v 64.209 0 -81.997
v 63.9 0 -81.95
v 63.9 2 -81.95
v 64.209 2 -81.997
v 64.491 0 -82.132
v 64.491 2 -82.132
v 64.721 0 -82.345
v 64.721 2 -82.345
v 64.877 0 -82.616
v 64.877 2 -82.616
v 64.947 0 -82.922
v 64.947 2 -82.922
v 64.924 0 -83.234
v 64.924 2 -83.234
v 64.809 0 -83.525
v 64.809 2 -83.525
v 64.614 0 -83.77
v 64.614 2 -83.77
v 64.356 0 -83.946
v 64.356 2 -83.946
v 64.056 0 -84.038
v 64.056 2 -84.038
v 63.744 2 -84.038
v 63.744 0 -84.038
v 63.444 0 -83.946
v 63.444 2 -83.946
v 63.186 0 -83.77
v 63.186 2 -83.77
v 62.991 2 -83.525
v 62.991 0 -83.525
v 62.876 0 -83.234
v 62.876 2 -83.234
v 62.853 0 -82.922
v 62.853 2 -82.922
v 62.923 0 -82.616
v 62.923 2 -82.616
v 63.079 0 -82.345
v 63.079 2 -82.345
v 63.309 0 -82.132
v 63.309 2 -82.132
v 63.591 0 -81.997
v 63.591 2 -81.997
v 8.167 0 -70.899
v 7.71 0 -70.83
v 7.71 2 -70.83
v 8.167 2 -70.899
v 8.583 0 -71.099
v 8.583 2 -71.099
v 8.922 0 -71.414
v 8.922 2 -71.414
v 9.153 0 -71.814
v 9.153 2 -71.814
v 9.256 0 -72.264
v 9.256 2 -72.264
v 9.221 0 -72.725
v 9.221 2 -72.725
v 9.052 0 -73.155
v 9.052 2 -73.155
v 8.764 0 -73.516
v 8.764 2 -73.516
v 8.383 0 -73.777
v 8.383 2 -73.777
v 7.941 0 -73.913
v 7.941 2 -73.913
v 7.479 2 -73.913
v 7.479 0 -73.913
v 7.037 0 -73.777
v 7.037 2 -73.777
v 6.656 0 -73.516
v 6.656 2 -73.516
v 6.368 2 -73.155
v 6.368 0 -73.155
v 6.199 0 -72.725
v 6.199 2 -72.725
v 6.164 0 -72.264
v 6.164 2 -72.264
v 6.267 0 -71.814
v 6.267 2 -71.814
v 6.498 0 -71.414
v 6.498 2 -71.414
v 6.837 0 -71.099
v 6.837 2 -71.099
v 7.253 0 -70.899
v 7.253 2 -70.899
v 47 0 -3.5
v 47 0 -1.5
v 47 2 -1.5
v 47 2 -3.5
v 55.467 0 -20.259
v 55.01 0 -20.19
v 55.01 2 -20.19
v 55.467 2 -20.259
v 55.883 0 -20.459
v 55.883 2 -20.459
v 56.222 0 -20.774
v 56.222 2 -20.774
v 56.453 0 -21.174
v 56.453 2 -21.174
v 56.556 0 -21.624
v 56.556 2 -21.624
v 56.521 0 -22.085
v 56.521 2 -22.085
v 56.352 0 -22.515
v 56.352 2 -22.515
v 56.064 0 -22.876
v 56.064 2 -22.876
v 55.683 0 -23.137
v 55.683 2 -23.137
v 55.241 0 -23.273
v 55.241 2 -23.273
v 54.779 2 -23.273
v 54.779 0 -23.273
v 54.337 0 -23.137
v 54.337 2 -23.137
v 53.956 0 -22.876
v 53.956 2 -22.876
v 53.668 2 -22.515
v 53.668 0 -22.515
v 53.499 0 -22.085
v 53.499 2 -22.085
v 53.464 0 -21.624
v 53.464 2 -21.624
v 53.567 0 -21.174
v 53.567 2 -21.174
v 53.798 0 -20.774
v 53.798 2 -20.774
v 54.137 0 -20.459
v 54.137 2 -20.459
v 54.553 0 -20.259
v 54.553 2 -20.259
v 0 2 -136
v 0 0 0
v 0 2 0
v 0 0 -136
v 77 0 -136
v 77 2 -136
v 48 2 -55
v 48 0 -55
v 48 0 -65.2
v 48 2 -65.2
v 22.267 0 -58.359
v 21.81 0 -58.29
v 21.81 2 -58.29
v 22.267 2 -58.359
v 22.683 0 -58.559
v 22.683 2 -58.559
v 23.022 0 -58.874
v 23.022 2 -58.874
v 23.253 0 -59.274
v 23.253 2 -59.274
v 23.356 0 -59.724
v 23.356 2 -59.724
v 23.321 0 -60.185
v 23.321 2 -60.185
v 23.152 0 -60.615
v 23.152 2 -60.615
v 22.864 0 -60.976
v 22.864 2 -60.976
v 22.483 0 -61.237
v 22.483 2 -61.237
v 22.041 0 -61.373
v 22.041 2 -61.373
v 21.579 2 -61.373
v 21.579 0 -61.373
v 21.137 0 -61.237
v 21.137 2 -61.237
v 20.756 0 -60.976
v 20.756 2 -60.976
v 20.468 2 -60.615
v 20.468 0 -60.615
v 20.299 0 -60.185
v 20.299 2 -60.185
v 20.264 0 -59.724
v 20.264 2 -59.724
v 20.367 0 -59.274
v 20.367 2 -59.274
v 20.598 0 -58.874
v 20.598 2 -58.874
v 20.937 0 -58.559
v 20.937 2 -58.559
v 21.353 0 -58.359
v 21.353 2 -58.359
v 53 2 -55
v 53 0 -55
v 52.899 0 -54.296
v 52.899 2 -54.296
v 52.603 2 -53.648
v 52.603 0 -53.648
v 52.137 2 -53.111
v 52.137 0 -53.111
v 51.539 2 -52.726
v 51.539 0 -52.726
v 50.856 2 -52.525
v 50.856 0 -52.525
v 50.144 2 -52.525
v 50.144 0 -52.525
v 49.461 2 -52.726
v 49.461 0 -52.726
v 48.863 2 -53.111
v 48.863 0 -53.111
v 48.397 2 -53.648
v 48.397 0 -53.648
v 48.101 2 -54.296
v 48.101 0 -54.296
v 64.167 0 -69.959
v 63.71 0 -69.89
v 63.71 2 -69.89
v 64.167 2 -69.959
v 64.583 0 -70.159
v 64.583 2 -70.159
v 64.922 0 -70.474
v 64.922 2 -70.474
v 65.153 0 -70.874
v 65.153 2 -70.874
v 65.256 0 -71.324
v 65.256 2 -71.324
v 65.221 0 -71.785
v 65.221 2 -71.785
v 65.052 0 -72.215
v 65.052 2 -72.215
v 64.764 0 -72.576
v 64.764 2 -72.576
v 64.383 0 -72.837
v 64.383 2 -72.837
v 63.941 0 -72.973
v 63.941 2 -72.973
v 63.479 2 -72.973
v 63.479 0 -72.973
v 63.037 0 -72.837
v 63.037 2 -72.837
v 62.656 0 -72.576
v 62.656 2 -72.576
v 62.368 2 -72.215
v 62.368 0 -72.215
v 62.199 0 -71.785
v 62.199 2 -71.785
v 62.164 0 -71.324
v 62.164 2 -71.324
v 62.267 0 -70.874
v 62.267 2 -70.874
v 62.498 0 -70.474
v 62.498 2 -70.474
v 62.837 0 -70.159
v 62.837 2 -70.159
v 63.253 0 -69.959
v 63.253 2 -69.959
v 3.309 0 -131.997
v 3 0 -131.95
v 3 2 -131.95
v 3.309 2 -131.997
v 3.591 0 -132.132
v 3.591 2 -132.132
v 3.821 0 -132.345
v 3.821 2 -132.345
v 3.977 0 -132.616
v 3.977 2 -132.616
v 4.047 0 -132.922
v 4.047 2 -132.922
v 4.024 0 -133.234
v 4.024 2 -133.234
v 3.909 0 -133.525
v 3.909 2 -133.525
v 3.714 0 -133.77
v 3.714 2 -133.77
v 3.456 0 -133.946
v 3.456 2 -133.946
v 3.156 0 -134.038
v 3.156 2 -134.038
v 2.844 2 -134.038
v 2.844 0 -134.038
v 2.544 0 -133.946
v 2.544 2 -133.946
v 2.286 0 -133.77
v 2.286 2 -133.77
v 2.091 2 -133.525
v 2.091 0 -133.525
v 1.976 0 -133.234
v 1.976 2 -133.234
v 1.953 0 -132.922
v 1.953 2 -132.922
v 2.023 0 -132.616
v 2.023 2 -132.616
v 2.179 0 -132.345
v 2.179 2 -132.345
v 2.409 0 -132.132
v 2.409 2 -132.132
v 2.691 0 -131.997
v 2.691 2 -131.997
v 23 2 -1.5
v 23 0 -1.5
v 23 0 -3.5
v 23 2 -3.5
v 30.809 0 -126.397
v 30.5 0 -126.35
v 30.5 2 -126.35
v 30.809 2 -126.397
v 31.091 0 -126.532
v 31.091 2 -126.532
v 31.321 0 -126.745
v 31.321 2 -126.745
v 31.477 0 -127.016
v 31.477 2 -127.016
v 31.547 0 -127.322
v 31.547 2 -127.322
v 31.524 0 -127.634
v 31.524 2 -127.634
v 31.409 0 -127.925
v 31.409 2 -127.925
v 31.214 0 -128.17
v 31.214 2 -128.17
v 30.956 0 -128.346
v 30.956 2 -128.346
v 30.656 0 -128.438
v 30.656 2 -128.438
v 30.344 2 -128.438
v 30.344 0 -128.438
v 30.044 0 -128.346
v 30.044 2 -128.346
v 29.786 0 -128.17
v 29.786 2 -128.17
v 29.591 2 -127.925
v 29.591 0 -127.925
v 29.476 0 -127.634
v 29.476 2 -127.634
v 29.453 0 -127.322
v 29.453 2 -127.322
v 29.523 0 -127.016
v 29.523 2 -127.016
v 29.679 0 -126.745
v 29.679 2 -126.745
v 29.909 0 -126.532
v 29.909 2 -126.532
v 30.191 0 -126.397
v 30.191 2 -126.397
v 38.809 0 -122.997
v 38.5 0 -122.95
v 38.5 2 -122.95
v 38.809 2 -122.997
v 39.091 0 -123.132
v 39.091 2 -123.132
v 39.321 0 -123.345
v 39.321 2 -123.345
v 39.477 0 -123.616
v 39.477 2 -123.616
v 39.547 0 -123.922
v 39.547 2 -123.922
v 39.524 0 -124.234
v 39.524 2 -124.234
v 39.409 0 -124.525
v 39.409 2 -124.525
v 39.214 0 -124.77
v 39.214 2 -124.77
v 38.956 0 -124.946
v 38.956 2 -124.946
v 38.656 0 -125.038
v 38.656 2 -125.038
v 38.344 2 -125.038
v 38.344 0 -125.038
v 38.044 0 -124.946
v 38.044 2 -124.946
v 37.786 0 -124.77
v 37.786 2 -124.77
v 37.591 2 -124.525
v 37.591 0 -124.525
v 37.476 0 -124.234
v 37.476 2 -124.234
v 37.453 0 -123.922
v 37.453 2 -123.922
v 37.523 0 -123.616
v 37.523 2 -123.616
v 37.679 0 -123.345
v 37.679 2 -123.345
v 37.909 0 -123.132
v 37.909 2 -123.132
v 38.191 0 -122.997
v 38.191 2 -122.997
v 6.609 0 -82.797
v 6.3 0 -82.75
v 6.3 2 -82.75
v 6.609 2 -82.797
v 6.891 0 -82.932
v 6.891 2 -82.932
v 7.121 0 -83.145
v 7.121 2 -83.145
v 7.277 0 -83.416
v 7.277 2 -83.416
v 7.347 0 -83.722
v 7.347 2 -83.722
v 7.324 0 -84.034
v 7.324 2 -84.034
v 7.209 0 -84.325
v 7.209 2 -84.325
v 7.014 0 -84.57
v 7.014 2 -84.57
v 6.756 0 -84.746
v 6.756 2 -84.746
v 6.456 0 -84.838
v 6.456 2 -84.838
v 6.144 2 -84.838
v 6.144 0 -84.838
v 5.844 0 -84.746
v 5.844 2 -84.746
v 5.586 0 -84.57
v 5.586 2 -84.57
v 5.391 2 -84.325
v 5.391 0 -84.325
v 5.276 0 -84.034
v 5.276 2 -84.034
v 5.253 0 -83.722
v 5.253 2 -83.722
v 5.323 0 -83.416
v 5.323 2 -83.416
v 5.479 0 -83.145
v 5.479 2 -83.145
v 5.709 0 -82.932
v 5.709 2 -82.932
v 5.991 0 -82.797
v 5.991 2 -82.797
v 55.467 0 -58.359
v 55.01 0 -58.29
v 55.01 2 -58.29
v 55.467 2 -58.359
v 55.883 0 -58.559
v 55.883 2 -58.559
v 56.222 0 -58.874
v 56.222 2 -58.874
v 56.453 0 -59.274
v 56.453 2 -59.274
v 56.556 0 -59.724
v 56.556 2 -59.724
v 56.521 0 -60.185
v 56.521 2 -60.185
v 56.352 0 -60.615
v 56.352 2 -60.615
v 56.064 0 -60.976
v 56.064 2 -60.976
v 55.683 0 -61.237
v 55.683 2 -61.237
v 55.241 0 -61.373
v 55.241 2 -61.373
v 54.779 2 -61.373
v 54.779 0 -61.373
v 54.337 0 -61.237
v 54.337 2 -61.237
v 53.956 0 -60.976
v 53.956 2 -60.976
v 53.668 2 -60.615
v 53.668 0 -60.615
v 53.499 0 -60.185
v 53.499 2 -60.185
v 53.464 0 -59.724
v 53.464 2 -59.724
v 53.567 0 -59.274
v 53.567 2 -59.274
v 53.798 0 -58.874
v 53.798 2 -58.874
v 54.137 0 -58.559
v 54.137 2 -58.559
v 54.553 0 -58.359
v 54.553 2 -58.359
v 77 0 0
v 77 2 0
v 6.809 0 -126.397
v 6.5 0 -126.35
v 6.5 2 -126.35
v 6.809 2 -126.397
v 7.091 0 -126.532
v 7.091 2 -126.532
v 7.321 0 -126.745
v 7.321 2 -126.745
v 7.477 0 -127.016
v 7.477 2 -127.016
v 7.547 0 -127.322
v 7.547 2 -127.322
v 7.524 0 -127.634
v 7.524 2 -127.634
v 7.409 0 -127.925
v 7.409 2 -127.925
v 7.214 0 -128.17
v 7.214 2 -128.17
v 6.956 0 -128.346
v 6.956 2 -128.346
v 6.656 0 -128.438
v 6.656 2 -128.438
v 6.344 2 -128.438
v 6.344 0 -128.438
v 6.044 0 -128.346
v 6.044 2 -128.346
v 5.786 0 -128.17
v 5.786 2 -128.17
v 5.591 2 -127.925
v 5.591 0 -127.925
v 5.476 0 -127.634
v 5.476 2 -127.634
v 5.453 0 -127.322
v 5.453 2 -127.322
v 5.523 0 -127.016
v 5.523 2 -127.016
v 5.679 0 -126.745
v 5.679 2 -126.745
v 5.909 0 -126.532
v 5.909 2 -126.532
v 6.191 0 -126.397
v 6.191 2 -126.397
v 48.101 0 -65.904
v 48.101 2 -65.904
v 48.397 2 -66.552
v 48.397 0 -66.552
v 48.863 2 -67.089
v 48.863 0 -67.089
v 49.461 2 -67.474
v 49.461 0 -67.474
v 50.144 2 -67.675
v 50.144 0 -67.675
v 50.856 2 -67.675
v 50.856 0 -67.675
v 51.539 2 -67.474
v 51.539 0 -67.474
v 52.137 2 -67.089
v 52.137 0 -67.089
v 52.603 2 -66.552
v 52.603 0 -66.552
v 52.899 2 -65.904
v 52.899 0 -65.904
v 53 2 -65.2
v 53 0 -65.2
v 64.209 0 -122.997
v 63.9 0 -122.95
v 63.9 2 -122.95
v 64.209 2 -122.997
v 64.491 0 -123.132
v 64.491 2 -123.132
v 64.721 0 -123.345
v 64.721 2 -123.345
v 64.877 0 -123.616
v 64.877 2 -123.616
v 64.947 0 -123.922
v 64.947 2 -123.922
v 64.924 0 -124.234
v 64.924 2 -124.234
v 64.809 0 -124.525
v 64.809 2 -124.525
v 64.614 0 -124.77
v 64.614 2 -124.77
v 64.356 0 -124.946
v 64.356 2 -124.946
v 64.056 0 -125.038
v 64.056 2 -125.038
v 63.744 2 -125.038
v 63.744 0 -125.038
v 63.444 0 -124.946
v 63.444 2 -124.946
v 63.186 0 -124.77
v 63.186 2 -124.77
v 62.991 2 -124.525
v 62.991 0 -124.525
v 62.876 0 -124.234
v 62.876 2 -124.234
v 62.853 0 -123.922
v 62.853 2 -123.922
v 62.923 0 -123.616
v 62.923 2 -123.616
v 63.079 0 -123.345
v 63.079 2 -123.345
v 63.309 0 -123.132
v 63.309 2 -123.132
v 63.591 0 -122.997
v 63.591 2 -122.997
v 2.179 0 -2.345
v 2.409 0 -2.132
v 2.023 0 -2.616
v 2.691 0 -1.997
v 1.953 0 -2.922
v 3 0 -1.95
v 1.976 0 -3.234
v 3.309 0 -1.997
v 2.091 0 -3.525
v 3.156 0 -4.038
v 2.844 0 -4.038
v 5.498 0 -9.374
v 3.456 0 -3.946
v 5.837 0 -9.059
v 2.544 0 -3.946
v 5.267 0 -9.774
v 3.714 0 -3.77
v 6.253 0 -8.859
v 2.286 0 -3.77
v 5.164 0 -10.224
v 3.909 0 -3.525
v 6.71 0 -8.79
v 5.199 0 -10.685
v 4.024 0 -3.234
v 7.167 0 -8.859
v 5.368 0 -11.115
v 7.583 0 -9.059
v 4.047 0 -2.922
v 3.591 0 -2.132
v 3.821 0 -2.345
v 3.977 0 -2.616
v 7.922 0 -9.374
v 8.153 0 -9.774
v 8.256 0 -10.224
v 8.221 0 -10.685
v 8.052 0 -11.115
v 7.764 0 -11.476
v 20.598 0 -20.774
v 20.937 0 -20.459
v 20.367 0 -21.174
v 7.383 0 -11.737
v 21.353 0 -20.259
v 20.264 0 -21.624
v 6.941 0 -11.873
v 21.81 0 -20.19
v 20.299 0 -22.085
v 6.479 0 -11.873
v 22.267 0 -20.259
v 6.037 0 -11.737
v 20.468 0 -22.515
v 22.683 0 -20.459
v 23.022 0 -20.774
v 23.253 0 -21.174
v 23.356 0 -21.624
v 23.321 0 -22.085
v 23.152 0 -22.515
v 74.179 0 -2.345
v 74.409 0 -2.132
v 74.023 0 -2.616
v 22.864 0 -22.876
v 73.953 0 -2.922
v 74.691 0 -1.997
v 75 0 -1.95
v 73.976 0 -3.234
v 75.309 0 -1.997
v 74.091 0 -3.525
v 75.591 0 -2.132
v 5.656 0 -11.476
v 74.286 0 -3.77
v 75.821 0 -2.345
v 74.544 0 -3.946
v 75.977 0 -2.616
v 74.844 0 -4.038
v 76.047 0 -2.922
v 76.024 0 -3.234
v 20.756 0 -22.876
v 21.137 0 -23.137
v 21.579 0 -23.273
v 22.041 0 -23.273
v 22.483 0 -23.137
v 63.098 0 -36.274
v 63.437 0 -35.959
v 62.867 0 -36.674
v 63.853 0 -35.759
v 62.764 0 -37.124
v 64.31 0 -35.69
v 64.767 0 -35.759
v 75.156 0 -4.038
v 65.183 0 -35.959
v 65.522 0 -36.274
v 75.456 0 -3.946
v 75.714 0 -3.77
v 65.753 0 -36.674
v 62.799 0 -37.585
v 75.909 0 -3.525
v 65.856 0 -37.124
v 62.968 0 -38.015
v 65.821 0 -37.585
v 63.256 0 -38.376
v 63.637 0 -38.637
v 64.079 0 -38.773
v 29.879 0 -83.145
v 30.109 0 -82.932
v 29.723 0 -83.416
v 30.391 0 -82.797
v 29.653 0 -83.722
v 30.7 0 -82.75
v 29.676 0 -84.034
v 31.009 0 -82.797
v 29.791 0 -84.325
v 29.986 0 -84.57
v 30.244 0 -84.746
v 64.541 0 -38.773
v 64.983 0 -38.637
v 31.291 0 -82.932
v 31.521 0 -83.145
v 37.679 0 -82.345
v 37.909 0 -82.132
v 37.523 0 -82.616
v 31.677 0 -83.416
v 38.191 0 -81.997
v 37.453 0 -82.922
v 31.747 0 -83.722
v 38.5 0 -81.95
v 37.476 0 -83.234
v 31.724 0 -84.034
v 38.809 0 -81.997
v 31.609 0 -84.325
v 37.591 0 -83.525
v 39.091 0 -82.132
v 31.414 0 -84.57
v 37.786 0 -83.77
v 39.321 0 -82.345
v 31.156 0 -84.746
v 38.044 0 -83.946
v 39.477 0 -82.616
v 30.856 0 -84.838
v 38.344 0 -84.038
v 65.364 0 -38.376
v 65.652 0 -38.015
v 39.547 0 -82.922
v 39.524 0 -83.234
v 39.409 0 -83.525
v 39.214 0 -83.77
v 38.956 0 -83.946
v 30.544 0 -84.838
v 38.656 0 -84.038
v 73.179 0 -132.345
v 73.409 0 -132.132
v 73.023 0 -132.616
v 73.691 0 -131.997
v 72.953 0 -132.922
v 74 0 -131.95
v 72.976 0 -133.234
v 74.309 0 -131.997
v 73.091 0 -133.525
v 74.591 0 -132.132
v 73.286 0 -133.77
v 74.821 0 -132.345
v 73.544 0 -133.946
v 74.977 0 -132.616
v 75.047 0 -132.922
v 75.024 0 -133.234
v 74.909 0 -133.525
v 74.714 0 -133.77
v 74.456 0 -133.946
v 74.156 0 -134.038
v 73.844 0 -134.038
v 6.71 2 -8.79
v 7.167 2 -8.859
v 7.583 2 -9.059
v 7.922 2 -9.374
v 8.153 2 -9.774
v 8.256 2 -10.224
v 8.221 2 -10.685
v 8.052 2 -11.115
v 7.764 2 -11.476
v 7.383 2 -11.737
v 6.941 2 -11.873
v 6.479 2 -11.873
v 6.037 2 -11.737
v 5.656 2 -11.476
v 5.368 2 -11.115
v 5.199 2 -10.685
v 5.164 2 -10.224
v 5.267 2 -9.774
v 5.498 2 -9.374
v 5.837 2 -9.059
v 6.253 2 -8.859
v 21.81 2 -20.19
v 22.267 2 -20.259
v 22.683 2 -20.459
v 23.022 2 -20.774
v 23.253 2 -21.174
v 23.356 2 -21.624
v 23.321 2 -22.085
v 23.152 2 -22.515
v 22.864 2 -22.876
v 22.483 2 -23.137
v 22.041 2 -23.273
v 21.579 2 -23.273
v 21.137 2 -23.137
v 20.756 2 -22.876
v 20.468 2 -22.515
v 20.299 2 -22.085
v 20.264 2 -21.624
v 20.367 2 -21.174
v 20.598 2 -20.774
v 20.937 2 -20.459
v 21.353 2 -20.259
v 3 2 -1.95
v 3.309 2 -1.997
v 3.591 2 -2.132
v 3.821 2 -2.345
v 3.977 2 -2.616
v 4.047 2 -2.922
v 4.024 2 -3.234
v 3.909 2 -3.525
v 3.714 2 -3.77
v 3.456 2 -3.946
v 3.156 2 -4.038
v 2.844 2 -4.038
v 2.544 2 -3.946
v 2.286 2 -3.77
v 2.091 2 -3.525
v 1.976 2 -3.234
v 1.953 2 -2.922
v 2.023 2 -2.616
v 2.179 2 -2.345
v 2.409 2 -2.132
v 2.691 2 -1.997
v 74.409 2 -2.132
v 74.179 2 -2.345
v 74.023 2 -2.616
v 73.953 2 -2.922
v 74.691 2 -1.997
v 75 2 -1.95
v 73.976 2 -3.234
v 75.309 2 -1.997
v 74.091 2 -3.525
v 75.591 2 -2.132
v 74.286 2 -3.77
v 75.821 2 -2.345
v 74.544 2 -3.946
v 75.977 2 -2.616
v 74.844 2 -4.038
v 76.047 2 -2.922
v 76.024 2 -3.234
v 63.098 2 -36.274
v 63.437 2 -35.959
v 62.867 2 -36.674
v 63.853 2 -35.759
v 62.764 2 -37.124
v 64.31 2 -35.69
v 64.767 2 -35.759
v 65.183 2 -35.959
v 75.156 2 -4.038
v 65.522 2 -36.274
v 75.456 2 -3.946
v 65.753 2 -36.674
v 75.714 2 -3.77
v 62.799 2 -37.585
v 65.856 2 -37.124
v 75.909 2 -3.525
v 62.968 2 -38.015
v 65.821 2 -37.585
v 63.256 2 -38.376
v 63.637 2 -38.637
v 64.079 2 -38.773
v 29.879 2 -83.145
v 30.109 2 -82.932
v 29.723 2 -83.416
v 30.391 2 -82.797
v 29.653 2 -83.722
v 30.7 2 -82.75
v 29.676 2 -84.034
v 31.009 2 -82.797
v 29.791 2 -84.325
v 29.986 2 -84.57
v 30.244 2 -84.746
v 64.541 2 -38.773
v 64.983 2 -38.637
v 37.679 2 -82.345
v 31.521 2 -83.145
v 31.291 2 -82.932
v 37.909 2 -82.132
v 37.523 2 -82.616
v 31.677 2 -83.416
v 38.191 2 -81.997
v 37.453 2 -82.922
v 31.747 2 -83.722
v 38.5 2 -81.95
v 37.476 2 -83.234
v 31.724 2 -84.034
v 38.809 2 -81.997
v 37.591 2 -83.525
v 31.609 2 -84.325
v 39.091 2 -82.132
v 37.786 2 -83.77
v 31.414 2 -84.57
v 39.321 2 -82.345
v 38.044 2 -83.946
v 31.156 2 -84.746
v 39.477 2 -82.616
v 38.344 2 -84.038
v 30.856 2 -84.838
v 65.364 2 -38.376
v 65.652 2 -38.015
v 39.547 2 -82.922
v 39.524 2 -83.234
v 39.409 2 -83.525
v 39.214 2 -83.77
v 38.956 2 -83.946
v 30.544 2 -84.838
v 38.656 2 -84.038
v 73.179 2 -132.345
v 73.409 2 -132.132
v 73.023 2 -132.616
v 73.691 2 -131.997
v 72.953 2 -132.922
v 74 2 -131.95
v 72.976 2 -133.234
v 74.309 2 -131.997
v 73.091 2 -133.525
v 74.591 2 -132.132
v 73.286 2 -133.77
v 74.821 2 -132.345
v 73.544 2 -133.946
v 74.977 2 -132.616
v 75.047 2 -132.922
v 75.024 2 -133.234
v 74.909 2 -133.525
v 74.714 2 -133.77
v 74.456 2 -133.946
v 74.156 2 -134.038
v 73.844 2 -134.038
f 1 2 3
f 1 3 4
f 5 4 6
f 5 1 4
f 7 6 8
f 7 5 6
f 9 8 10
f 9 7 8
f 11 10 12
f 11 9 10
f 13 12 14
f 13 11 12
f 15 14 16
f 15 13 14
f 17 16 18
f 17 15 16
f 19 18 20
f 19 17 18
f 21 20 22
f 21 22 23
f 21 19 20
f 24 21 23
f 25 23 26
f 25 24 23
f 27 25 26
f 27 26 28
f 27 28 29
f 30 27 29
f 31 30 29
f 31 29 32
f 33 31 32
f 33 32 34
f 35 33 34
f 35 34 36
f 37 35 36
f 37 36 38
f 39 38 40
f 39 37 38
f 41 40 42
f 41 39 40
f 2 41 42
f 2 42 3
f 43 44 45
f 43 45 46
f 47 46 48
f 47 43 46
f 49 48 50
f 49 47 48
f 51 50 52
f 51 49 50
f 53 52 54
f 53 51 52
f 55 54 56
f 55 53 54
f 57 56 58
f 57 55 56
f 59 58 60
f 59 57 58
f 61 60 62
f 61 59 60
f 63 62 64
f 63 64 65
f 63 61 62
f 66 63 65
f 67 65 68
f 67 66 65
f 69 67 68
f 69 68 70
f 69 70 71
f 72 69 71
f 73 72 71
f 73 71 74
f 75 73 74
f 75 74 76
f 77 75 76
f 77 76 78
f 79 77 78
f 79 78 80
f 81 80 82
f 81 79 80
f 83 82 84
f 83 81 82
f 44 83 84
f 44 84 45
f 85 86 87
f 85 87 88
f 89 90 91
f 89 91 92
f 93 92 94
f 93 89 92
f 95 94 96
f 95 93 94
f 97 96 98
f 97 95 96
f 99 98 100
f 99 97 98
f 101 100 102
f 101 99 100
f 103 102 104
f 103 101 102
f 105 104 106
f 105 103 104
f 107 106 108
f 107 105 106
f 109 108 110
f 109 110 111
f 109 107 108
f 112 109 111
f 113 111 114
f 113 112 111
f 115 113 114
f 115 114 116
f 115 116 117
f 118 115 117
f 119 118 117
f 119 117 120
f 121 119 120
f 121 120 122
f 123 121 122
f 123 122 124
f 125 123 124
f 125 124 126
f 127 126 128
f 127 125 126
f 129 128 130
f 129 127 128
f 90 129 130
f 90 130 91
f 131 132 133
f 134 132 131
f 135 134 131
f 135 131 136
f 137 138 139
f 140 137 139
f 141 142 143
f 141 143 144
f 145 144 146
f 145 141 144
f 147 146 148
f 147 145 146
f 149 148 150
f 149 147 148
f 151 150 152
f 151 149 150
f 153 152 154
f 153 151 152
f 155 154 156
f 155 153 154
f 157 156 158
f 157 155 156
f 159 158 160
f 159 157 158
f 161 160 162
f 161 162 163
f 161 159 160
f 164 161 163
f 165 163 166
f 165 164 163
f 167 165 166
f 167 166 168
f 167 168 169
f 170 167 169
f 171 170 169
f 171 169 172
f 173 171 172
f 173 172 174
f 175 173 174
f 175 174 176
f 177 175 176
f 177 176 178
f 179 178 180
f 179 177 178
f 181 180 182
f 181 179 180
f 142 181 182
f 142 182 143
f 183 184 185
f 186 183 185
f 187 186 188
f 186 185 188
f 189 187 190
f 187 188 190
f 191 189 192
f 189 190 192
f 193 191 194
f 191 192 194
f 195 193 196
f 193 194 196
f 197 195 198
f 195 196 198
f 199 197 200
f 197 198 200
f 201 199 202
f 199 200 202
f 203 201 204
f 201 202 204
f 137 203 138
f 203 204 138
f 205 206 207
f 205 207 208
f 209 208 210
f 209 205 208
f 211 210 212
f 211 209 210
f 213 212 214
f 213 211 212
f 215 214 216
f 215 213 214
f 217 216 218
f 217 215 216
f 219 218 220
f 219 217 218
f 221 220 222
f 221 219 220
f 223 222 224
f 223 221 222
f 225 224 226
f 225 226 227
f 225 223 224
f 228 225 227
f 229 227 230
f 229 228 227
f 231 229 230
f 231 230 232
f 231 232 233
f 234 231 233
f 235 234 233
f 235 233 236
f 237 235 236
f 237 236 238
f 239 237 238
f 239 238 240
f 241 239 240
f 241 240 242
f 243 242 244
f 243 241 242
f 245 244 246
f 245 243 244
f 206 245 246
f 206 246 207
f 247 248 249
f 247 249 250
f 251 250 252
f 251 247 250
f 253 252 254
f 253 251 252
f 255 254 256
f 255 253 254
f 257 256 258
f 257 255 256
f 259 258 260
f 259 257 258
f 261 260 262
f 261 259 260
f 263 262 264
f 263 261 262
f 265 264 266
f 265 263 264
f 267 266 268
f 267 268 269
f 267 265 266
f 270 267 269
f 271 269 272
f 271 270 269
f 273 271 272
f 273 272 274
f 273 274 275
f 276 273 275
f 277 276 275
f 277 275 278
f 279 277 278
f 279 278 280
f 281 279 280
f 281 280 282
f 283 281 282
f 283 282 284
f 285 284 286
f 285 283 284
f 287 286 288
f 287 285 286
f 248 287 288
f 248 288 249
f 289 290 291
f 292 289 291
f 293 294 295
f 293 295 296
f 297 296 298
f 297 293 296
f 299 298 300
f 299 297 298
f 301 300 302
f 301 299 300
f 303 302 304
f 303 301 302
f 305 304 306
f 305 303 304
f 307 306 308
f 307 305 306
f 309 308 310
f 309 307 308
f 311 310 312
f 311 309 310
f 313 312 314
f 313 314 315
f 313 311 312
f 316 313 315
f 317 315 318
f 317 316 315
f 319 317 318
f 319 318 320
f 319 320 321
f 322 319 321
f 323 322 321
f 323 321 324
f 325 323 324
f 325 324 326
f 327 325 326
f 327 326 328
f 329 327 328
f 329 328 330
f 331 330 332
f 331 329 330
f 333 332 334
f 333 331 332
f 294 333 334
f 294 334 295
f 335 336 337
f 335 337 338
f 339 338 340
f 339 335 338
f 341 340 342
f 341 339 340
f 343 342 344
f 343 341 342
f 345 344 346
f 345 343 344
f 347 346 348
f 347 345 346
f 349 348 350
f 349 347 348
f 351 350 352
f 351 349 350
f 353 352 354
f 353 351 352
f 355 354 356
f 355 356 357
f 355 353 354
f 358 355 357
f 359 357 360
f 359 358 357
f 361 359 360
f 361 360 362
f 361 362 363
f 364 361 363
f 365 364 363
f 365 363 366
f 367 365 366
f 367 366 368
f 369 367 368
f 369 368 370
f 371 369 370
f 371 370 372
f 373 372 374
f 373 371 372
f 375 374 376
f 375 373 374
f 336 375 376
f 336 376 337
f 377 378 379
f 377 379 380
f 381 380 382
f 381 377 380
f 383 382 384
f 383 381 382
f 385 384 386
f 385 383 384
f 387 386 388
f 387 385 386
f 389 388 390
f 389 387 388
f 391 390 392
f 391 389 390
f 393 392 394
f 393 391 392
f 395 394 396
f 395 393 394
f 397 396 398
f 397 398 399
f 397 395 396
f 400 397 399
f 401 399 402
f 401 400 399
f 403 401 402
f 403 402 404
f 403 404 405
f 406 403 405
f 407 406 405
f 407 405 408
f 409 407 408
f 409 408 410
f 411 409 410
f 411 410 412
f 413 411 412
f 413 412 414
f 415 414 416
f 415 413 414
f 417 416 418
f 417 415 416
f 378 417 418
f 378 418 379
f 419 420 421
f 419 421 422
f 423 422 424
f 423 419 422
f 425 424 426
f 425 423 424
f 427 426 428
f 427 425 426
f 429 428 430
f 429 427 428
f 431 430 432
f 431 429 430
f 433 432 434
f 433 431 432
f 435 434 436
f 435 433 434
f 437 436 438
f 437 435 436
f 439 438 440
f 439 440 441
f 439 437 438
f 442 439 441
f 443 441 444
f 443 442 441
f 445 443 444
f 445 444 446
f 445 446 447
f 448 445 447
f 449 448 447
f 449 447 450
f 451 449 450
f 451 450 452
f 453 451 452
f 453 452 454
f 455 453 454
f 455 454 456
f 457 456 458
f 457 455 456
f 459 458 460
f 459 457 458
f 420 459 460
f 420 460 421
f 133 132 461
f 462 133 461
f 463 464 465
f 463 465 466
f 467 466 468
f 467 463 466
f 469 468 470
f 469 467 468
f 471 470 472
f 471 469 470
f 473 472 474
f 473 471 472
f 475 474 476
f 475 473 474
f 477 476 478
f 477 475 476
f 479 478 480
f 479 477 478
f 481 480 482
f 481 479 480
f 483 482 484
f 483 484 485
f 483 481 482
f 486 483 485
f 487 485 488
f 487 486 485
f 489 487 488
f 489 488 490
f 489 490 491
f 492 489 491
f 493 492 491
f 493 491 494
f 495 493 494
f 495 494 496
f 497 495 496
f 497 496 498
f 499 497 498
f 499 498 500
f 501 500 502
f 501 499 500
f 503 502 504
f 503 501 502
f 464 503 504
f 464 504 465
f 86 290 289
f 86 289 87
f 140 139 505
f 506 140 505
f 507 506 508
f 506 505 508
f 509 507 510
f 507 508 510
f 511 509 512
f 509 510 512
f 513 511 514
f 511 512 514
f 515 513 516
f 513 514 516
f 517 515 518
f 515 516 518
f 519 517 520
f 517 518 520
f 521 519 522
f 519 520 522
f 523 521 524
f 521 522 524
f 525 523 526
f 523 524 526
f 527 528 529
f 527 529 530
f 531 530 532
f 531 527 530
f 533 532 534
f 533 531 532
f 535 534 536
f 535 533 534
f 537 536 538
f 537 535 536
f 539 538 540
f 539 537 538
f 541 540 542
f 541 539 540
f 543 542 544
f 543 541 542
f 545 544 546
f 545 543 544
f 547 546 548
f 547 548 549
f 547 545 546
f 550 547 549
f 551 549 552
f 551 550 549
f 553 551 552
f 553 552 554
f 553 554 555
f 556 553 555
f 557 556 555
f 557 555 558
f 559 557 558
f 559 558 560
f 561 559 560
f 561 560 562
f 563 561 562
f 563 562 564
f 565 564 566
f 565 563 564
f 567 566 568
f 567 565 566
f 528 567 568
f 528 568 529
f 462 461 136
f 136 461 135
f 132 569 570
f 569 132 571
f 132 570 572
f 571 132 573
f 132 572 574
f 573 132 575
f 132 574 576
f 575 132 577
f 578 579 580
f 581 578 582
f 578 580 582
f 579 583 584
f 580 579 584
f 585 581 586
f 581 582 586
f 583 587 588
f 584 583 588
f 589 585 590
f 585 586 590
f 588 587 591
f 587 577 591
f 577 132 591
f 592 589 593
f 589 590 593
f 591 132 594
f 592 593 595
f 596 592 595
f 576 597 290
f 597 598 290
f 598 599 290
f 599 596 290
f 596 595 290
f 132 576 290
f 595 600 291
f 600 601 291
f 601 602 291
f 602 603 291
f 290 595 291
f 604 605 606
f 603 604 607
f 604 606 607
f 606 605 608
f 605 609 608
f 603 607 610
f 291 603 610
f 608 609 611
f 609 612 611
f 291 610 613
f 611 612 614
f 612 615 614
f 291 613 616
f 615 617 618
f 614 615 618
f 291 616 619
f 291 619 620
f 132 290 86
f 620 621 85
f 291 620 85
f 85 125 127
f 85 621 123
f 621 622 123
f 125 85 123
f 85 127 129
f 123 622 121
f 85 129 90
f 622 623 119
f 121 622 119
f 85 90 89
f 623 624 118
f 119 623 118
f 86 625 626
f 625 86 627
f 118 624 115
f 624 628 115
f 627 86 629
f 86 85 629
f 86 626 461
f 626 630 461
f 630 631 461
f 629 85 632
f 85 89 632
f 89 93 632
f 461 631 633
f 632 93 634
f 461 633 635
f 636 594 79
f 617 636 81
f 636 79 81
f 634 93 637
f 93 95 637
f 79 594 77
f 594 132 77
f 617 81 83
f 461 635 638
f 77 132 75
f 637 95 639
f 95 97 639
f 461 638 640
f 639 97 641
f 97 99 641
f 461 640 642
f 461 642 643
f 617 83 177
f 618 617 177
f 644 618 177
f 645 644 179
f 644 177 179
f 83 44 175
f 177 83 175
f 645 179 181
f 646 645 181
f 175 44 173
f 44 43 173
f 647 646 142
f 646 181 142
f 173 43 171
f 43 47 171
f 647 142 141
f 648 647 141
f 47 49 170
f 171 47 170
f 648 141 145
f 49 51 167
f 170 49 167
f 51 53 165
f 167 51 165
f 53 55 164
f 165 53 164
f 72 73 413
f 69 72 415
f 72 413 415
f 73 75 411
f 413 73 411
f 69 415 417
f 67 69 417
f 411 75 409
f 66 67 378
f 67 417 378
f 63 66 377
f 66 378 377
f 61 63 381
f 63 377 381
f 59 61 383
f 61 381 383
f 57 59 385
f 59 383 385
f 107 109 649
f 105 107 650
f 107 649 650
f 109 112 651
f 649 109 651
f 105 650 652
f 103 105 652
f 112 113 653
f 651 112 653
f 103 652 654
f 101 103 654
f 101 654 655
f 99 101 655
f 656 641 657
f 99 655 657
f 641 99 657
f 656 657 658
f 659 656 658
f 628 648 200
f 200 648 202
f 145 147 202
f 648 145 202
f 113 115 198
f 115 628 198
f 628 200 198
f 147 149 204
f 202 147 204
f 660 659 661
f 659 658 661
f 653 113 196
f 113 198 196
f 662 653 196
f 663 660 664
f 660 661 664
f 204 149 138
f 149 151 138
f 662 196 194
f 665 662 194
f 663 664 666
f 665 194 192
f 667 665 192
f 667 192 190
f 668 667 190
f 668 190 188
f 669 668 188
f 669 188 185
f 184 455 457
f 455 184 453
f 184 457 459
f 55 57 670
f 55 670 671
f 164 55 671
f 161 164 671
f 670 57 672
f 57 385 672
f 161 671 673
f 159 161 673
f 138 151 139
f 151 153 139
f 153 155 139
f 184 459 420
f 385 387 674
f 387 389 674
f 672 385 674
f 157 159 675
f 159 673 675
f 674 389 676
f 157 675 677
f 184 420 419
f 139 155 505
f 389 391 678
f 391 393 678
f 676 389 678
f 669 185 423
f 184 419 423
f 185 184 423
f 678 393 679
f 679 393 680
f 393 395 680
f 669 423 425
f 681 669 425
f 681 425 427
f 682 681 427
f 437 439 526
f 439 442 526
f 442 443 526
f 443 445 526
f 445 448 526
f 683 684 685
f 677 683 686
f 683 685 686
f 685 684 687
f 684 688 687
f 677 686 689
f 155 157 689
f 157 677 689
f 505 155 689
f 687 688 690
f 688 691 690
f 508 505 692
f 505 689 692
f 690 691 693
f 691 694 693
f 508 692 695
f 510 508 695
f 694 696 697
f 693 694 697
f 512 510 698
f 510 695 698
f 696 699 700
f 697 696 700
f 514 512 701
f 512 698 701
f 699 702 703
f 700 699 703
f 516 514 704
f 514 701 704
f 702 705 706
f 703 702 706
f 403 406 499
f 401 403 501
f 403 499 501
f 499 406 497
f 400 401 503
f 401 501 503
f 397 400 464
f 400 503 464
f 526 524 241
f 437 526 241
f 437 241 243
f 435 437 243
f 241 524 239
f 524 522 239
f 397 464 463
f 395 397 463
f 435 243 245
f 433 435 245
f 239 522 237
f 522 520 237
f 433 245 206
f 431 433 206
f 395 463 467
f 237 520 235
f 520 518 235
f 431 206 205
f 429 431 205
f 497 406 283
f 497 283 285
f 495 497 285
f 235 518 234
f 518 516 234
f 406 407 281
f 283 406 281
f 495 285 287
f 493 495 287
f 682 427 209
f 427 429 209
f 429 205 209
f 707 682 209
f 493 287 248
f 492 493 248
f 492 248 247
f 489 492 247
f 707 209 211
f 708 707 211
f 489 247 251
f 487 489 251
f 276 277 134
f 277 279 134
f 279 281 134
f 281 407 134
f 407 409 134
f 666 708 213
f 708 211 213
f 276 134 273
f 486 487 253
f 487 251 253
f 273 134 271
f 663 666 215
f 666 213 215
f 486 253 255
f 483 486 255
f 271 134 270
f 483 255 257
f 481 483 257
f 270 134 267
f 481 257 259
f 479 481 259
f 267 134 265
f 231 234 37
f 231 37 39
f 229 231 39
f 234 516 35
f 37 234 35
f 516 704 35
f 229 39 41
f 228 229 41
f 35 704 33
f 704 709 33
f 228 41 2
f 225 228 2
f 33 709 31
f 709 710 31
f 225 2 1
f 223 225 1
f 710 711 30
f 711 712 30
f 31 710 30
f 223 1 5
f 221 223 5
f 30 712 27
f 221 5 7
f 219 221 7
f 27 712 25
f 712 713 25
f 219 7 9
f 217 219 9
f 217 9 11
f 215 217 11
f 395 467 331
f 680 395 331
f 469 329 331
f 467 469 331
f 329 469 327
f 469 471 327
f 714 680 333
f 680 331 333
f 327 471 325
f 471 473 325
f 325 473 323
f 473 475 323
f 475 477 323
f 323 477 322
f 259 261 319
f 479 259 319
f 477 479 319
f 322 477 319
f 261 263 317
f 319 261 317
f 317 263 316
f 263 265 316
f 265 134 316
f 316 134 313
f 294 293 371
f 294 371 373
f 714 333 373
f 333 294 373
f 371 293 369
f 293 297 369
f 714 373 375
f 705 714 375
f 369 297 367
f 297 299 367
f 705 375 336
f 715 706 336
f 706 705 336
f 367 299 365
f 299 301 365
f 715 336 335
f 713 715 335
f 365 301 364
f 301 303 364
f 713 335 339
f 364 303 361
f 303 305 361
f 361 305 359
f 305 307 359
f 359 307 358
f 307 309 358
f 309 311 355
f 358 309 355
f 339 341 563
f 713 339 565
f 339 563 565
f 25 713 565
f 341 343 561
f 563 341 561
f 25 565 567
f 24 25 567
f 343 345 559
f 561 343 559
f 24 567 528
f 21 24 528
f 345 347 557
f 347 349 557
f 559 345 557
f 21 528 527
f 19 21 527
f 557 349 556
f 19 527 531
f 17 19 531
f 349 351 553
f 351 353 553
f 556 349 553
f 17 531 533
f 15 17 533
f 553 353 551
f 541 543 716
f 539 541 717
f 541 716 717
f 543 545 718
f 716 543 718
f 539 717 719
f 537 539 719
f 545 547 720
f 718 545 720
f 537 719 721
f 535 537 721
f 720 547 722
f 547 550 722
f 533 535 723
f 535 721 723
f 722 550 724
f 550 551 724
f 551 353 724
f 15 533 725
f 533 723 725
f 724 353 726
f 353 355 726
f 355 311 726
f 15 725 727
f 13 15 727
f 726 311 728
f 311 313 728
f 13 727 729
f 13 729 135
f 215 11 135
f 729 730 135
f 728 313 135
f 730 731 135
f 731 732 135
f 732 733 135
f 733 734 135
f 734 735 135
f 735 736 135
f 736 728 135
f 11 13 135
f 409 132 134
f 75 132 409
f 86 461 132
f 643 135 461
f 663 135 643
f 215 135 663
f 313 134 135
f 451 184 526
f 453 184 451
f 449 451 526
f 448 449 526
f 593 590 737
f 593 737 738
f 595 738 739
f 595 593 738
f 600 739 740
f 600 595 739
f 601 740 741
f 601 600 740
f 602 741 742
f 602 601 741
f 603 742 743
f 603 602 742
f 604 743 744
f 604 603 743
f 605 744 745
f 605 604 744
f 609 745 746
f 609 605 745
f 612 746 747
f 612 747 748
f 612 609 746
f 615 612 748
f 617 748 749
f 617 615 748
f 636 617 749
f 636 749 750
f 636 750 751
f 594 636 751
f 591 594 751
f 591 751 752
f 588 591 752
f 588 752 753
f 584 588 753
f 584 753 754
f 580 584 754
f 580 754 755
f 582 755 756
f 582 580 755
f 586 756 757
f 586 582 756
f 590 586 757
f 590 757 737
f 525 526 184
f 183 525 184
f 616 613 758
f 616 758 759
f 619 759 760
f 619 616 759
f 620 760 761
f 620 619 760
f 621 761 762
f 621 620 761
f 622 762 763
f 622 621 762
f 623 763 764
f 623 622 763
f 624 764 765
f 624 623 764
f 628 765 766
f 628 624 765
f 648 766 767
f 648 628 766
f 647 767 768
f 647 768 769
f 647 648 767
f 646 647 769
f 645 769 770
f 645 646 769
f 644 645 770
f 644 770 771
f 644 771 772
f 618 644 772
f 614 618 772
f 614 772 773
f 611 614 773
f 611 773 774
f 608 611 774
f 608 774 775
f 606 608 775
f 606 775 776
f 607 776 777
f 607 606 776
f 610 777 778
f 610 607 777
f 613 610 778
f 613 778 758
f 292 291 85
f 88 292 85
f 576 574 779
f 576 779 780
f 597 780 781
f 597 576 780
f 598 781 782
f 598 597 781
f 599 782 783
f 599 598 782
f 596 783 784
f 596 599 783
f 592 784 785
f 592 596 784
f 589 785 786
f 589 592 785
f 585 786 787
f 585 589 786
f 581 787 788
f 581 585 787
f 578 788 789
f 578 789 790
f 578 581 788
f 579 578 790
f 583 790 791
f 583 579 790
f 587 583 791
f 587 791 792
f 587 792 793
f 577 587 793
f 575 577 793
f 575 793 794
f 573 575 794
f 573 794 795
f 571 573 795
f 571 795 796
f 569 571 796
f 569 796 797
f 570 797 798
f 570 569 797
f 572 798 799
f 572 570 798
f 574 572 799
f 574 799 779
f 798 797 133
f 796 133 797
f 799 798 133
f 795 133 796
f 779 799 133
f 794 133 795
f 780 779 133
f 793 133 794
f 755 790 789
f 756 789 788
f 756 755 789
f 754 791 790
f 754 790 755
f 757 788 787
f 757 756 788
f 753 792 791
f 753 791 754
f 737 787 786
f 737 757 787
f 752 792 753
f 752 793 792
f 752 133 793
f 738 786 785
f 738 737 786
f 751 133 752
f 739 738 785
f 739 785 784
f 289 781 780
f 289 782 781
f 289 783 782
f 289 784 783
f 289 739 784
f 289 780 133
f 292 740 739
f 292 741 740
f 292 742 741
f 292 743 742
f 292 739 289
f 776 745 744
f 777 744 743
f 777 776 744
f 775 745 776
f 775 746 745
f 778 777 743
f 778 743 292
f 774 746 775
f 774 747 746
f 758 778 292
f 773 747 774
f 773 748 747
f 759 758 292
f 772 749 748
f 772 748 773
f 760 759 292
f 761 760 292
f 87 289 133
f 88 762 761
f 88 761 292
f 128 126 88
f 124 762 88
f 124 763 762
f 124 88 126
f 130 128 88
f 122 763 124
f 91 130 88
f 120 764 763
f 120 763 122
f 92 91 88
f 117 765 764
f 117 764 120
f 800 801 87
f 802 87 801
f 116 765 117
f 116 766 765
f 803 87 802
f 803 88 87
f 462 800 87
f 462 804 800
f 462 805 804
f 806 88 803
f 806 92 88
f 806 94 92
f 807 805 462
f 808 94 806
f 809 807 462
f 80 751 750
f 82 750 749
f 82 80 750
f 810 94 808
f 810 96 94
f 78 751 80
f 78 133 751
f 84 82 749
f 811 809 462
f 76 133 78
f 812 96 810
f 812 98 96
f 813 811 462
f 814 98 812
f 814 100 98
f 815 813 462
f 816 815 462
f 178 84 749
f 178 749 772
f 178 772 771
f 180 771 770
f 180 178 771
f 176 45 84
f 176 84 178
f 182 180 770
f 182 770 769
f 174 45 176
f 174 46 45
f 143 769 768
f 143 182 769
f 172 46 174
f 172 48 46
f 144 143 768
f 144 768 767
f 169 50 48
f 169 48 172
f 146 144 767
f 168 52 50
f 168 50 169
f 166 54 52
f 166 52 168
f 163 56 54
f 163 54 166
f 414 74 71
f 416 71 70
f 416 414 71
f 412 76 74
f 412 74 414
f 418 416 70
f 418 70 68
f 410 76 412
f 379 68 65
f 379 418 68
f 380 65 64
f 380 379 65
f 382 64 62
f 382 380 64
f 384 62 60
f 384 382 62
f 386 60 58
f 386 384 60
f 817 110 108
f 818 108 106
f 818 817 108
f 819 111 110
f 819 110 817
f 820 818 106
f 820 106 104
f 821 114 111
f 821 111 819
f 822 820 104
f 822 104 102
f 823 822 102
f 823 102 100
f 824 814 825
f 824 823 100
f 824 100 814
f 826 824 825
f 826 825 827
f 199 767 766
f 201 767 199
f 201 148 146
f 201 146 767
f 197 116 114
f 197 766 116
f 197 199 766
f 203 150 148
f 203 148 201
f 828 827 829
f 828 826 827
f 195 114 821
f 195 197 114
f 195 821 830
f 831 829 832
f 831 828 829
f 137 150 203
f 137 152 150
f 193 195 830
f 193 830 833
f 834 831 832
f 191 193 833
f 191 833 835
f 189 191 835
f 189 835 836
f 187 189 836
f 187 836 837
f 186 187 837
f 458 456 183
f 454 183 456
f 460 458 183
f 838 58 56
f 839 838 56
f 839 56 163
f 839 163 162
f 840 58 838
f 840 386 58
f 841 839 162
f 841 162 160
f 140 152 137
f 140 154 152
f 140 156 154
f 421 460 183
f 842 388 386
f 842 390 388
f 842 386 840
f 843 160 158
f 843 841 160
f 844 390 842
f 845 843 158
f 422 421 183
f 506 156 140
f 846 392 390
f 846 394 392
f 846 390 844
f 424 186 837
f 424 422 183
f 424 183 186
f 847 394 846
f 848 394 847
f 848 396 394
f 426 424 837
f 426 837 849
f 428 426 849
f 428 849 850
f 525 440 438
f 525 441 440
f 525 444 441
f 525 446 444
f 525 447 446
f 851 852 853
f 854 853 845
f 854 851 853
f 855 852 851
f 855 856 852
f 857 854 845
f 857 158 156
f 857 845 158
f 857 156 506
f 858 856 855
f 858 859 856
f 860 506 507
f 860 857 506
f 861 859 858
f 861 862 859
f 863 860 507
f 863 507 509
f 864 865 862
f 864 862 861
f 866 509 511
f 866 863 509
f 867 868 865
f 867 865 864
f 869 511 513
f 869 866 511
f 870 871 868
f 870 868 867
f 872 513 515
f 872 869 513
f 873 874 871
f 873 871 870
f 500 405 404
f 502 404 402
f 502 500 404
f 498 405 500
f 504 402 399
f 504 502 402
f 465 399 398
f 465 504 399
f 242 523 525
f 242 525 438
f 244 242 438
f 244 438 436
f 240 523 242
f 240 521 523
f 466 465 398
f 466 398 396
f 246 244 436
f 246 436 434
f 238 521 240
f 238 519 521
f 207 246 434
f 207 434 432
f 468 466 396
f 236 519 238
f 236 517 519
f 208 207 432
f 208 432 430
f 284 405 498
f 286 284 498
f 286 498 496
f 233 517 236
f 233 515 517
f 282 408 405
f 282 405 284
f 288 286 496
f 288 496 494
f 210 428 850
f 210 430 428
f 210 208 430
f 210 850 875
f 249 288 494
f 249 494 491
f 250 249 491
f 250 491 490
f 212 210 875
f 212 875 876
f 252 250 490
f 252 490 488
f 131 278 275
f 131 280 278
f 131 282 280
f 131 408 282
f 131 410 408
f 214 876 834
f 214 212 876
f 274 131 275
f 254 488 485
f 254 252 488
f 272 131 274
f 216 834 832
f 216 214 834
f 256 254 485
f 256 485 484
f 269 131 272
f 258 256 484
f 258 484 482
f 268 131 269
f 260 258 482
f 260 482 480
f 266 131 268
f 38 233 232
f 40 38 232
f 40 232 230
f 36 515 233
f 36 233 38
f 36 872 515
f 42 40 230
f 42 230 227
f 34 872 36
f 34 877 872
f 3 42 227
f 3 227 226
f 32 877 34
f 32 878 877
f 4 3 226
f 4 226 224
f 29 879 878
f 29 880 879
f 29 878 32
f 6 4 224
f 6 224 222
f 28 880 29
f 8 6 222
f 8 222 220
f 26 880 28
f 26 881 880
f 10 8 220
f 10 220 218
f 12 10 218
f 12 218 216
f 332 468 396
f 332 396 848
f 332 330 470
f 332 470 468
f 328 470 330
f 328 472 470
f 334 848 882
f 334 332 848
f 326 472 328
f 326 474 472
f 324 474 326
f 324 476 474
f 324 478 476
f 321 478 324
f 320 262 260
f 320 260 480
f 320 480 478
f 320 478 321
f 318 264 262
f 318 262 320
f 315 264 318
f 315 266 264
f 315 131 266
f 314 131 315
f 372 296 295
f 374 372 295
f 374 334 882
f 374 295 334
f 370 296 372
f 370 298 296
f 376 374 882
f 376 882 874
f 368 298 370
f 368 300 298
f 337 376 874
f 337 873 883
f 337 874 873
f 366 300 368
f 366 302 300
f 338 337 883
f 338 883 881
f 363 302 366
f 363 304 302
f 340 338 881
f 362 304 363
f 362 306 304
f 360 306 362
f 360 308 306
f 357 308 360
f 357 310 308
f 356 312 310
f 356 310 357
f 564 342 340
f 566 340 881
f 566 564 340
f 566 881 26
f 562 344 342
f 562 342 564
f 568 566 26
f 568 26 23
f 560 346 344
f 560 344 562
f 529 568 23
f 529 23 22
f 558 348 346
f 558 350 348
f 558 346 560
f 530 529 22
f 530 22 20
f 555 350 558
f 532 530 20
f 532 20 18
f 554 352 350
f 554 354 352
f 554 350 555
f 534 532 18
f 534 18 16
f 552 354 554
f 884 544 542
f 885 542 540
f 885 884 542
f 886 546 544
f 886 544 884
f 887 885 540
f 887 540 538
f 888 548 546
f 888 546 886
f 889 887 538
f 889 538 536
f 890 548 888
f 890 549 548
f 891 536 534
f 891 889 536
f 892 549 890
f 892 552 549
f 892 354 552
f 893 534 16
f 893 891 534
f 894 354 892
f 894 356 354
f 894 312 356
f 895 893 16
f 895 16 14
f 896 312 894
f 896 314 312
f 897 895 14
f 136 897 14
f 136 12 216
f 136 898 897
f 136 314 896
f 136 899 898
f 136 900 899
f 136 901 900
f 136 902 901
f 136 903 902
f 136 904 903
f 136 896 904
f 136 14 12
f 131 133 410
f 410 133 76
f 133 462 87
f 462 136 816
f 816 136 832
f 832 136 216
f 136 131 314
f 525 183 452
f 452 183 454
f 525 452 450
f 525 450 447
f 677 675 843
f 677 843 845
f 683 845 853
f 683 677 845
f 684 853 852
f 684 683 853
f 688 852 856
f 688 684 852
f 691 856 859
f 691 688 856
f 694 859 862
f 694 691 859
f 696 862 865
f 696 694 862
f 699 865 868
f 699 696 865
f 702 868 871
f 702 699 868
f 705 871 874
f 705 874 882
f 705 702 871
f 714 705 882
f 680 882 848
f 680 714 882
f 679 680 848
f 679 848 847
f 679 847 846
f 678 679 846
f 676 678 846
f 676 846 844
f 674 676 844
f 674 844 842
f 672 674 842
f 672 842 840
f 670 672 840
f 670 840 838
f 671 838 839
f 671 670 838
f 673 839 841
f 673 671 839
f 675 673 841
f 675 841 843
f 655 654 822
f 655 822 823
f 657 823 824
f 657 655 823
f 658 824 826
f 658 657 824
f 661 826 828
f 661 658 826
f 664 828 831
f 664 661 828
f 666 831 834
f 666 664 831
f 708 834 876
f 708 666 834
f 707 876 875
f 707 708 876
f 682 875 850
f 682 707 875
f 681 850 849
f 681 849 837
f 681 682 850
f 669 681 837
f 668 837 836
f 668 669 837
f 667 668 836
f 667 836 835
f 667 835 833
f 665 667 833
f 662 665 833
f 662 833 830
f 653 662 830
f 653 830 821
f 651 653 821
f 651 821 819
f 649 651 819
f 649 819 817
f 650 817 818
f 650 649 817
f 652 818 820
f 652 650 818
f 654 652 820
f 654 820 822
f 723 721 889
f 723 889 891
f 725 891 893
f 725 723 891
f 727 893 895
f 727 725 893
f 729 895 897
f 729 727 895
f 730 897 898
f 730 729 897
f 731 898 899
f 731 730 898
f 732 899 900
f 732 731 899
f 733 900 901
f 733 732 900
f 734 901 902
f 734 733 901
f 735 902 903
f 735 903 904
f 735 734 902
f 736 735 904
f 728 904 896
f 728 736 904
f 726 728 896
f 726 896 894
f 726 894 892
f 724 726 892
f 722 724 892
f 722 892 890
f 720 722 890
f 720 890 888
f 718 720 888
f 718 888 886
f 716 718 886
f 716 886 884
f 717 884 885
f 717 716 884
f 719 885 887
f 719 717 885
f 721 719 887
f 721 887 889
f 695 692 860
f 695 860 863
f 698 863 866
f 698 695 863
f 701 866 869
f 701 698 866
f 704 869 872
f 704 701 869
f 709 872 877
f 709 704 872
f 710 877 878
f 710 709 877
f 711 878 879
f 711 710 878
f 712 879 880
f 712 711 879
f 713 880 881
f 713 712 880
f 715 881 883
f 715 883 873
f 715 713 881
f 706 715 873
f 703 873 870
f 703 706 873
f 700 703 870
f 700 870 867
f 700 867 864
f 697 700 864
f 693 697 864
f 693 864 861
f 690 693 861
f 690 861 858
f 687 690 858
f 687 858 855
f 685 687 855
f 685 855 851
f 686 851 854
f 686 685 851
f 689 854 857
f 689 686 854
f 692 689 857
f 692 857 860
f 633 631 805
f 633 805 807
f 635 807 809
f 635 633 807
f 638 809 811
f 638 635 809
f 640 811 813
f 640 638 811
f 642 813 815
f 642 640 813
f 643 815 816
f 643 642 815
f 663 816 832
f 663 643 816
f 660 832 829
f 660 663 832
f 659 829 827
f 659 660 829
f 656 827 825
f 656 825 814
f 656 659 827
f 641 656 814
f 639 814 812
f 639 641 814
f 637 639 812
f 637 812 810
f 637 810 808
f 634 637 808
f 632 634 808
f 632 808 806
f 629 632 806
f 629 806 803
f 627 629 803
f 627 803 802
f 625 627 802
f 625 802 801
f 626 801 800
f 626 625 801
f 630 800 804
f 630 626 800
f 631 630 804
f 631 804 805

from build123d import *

# Parameters (mm, degrees)
SKETCH_1_W      = 77
SKETCH_1_H      = 136
SKETCH_1_R      = 1.55
SKETCH_1_R_2    = 1.05
SKETCH_1_W_2    = 24
SKETCH_1_H_2    = 2
EXTRUDE_1_DEPTH = 2


with BuildPart() as part:
    # 草图1 → 凸台-拉伸1 (new body)
    with BuildSketch(Plane(origin=(0, 0, 0), x_dir=(1, 0, 0), z_dir=(0, 1, 0))):
        with Locations((38.5, 68)):
            Rectangle(SKETCH_1_W, SKETCH_1_H)
        with Locations(Location((7.71, 72.38, 0), (0, 0, 270))):
            Circle(SKETCH_1_R, mode=Mode.SUBTRACT)
        with Locations(Location((6.71, 10.34, 0), (0, 0, 270))):
            Circle(SKETCH_1_R, mode=Mode.SUBTRACT)
        with Locations(Location((63.71, 71.44, 0), (0, 0, 270))):
            Circle(SKETCH_1_R, mode=Mode.SUBTRACT)
        with Locations(Location((64.31, 37.24, 0), (0, 0, 270))):
            Circle(SKETCH_1_R, mode=Mode.SUBTRACT)
        with Locations(Location((21.81, 21.74, 0), (0, 0, 270))):
            Circle(SKETCH_1_R, mode=Mode.SUBTRACT)
        with Locations(Location((55.01, 21.74, 0), (0, 0, 270))):
            Circle(SKETCH_1_R, mode=Mode.SUBTRACT)
        with Locations(Location((21.81, 59.84, 0), (0, 0, 270))):
            Circle(SKETCH_1_R, mode=Mode.SUBTRACT)
        with Locations(Location((55.01, 59.84, 0), (0, 0, 270))):
            Circle(SKETCH_1_R, mode=Mode.SUBTRACT)
        with Locations(Location((6.5, 127.4, 0), (0, 0, 270))):
            Circle(SKETCH_1_R_2, mode=Mode.SUBTRACT)
        with Locations(Location((30.5, 127.4, 0), (0, 0, 270))):
            Circle(SKETCH_1_R_2, mode=Mode.SUBTRACT)
        with Locations(Location((6.3, 83.8, 0), (0, 0, 270))):
            Circle(SKETCH_1_R_2, mode=Mode.SUBTRACT)
        with Locations(Location((30.7, 83.8, 0), (0, 0, 270))):
            Circle(SKETCH_1_R_2, mode=Mode.SUBTRACT)
        with Locations(Location((38.5, 124, 0), (0, 0, 270))):
            Circle(SKETCH_1_R_2, mode=Mode.SUBTRACT)
        with Locations(Location((63.9, 124, 0), (0, 0, 270))):
            Circle(SKETCH_1_R_2, mode=Mode.SUBTRACT)
        with Locations(Location((38.5, 83, 0), (0, 0, 270))):
            Circle(SKETCH_1_R_2, mode=Mode.SUBTRACT)
        with Locations(Location((63.9, 83, 0), (0, 0, 270))):
            Circle(SKETCH_1_R_2, mode=Mode.SUBTRACT)
        with Locations(Location((3, 3, 0), (0, 0, 270))):
            Circle(SKETCH_1_R_2, mode=Mode.SUBTRACT)
        with Locations(Location((75, 3, 0), (0, 0, 270))):
            Circle(SKETCH_1_R_2, mode=Mode.SUBTRACT)
        with Locations(Location((3, 133, 0), (0, 0, 270))):
            Circle(SKETCH_1_R_2, mode=Mode.SUBTRACT)
        with Locations(Location((74, 133, 0), (0, 0, 270))):
            Circle(SKETCH_1_R_2, mode=Mode.SUBTRACT)
        with BuildLine():
            Line((53, 65.2), (53, 55))
            ThreePointArc((53, 55), (50.5, 52.5), (48, 55))
            Line((48, 55), (48, 65.2))
            ThreePointArc((48, 65.2), (50.5, 67.7), (53, 65.2))
        make_face(mode=Mode.SUBTRACT)
        with Locations((35, 2.5)):
            Rectangle(SKETCH_1_W_2, SKETCH_1_H_2, mode=Mode.SUBTRACT)
    extrude(amount=EXTRUDE_1_DEPTH)


solid = part.part
